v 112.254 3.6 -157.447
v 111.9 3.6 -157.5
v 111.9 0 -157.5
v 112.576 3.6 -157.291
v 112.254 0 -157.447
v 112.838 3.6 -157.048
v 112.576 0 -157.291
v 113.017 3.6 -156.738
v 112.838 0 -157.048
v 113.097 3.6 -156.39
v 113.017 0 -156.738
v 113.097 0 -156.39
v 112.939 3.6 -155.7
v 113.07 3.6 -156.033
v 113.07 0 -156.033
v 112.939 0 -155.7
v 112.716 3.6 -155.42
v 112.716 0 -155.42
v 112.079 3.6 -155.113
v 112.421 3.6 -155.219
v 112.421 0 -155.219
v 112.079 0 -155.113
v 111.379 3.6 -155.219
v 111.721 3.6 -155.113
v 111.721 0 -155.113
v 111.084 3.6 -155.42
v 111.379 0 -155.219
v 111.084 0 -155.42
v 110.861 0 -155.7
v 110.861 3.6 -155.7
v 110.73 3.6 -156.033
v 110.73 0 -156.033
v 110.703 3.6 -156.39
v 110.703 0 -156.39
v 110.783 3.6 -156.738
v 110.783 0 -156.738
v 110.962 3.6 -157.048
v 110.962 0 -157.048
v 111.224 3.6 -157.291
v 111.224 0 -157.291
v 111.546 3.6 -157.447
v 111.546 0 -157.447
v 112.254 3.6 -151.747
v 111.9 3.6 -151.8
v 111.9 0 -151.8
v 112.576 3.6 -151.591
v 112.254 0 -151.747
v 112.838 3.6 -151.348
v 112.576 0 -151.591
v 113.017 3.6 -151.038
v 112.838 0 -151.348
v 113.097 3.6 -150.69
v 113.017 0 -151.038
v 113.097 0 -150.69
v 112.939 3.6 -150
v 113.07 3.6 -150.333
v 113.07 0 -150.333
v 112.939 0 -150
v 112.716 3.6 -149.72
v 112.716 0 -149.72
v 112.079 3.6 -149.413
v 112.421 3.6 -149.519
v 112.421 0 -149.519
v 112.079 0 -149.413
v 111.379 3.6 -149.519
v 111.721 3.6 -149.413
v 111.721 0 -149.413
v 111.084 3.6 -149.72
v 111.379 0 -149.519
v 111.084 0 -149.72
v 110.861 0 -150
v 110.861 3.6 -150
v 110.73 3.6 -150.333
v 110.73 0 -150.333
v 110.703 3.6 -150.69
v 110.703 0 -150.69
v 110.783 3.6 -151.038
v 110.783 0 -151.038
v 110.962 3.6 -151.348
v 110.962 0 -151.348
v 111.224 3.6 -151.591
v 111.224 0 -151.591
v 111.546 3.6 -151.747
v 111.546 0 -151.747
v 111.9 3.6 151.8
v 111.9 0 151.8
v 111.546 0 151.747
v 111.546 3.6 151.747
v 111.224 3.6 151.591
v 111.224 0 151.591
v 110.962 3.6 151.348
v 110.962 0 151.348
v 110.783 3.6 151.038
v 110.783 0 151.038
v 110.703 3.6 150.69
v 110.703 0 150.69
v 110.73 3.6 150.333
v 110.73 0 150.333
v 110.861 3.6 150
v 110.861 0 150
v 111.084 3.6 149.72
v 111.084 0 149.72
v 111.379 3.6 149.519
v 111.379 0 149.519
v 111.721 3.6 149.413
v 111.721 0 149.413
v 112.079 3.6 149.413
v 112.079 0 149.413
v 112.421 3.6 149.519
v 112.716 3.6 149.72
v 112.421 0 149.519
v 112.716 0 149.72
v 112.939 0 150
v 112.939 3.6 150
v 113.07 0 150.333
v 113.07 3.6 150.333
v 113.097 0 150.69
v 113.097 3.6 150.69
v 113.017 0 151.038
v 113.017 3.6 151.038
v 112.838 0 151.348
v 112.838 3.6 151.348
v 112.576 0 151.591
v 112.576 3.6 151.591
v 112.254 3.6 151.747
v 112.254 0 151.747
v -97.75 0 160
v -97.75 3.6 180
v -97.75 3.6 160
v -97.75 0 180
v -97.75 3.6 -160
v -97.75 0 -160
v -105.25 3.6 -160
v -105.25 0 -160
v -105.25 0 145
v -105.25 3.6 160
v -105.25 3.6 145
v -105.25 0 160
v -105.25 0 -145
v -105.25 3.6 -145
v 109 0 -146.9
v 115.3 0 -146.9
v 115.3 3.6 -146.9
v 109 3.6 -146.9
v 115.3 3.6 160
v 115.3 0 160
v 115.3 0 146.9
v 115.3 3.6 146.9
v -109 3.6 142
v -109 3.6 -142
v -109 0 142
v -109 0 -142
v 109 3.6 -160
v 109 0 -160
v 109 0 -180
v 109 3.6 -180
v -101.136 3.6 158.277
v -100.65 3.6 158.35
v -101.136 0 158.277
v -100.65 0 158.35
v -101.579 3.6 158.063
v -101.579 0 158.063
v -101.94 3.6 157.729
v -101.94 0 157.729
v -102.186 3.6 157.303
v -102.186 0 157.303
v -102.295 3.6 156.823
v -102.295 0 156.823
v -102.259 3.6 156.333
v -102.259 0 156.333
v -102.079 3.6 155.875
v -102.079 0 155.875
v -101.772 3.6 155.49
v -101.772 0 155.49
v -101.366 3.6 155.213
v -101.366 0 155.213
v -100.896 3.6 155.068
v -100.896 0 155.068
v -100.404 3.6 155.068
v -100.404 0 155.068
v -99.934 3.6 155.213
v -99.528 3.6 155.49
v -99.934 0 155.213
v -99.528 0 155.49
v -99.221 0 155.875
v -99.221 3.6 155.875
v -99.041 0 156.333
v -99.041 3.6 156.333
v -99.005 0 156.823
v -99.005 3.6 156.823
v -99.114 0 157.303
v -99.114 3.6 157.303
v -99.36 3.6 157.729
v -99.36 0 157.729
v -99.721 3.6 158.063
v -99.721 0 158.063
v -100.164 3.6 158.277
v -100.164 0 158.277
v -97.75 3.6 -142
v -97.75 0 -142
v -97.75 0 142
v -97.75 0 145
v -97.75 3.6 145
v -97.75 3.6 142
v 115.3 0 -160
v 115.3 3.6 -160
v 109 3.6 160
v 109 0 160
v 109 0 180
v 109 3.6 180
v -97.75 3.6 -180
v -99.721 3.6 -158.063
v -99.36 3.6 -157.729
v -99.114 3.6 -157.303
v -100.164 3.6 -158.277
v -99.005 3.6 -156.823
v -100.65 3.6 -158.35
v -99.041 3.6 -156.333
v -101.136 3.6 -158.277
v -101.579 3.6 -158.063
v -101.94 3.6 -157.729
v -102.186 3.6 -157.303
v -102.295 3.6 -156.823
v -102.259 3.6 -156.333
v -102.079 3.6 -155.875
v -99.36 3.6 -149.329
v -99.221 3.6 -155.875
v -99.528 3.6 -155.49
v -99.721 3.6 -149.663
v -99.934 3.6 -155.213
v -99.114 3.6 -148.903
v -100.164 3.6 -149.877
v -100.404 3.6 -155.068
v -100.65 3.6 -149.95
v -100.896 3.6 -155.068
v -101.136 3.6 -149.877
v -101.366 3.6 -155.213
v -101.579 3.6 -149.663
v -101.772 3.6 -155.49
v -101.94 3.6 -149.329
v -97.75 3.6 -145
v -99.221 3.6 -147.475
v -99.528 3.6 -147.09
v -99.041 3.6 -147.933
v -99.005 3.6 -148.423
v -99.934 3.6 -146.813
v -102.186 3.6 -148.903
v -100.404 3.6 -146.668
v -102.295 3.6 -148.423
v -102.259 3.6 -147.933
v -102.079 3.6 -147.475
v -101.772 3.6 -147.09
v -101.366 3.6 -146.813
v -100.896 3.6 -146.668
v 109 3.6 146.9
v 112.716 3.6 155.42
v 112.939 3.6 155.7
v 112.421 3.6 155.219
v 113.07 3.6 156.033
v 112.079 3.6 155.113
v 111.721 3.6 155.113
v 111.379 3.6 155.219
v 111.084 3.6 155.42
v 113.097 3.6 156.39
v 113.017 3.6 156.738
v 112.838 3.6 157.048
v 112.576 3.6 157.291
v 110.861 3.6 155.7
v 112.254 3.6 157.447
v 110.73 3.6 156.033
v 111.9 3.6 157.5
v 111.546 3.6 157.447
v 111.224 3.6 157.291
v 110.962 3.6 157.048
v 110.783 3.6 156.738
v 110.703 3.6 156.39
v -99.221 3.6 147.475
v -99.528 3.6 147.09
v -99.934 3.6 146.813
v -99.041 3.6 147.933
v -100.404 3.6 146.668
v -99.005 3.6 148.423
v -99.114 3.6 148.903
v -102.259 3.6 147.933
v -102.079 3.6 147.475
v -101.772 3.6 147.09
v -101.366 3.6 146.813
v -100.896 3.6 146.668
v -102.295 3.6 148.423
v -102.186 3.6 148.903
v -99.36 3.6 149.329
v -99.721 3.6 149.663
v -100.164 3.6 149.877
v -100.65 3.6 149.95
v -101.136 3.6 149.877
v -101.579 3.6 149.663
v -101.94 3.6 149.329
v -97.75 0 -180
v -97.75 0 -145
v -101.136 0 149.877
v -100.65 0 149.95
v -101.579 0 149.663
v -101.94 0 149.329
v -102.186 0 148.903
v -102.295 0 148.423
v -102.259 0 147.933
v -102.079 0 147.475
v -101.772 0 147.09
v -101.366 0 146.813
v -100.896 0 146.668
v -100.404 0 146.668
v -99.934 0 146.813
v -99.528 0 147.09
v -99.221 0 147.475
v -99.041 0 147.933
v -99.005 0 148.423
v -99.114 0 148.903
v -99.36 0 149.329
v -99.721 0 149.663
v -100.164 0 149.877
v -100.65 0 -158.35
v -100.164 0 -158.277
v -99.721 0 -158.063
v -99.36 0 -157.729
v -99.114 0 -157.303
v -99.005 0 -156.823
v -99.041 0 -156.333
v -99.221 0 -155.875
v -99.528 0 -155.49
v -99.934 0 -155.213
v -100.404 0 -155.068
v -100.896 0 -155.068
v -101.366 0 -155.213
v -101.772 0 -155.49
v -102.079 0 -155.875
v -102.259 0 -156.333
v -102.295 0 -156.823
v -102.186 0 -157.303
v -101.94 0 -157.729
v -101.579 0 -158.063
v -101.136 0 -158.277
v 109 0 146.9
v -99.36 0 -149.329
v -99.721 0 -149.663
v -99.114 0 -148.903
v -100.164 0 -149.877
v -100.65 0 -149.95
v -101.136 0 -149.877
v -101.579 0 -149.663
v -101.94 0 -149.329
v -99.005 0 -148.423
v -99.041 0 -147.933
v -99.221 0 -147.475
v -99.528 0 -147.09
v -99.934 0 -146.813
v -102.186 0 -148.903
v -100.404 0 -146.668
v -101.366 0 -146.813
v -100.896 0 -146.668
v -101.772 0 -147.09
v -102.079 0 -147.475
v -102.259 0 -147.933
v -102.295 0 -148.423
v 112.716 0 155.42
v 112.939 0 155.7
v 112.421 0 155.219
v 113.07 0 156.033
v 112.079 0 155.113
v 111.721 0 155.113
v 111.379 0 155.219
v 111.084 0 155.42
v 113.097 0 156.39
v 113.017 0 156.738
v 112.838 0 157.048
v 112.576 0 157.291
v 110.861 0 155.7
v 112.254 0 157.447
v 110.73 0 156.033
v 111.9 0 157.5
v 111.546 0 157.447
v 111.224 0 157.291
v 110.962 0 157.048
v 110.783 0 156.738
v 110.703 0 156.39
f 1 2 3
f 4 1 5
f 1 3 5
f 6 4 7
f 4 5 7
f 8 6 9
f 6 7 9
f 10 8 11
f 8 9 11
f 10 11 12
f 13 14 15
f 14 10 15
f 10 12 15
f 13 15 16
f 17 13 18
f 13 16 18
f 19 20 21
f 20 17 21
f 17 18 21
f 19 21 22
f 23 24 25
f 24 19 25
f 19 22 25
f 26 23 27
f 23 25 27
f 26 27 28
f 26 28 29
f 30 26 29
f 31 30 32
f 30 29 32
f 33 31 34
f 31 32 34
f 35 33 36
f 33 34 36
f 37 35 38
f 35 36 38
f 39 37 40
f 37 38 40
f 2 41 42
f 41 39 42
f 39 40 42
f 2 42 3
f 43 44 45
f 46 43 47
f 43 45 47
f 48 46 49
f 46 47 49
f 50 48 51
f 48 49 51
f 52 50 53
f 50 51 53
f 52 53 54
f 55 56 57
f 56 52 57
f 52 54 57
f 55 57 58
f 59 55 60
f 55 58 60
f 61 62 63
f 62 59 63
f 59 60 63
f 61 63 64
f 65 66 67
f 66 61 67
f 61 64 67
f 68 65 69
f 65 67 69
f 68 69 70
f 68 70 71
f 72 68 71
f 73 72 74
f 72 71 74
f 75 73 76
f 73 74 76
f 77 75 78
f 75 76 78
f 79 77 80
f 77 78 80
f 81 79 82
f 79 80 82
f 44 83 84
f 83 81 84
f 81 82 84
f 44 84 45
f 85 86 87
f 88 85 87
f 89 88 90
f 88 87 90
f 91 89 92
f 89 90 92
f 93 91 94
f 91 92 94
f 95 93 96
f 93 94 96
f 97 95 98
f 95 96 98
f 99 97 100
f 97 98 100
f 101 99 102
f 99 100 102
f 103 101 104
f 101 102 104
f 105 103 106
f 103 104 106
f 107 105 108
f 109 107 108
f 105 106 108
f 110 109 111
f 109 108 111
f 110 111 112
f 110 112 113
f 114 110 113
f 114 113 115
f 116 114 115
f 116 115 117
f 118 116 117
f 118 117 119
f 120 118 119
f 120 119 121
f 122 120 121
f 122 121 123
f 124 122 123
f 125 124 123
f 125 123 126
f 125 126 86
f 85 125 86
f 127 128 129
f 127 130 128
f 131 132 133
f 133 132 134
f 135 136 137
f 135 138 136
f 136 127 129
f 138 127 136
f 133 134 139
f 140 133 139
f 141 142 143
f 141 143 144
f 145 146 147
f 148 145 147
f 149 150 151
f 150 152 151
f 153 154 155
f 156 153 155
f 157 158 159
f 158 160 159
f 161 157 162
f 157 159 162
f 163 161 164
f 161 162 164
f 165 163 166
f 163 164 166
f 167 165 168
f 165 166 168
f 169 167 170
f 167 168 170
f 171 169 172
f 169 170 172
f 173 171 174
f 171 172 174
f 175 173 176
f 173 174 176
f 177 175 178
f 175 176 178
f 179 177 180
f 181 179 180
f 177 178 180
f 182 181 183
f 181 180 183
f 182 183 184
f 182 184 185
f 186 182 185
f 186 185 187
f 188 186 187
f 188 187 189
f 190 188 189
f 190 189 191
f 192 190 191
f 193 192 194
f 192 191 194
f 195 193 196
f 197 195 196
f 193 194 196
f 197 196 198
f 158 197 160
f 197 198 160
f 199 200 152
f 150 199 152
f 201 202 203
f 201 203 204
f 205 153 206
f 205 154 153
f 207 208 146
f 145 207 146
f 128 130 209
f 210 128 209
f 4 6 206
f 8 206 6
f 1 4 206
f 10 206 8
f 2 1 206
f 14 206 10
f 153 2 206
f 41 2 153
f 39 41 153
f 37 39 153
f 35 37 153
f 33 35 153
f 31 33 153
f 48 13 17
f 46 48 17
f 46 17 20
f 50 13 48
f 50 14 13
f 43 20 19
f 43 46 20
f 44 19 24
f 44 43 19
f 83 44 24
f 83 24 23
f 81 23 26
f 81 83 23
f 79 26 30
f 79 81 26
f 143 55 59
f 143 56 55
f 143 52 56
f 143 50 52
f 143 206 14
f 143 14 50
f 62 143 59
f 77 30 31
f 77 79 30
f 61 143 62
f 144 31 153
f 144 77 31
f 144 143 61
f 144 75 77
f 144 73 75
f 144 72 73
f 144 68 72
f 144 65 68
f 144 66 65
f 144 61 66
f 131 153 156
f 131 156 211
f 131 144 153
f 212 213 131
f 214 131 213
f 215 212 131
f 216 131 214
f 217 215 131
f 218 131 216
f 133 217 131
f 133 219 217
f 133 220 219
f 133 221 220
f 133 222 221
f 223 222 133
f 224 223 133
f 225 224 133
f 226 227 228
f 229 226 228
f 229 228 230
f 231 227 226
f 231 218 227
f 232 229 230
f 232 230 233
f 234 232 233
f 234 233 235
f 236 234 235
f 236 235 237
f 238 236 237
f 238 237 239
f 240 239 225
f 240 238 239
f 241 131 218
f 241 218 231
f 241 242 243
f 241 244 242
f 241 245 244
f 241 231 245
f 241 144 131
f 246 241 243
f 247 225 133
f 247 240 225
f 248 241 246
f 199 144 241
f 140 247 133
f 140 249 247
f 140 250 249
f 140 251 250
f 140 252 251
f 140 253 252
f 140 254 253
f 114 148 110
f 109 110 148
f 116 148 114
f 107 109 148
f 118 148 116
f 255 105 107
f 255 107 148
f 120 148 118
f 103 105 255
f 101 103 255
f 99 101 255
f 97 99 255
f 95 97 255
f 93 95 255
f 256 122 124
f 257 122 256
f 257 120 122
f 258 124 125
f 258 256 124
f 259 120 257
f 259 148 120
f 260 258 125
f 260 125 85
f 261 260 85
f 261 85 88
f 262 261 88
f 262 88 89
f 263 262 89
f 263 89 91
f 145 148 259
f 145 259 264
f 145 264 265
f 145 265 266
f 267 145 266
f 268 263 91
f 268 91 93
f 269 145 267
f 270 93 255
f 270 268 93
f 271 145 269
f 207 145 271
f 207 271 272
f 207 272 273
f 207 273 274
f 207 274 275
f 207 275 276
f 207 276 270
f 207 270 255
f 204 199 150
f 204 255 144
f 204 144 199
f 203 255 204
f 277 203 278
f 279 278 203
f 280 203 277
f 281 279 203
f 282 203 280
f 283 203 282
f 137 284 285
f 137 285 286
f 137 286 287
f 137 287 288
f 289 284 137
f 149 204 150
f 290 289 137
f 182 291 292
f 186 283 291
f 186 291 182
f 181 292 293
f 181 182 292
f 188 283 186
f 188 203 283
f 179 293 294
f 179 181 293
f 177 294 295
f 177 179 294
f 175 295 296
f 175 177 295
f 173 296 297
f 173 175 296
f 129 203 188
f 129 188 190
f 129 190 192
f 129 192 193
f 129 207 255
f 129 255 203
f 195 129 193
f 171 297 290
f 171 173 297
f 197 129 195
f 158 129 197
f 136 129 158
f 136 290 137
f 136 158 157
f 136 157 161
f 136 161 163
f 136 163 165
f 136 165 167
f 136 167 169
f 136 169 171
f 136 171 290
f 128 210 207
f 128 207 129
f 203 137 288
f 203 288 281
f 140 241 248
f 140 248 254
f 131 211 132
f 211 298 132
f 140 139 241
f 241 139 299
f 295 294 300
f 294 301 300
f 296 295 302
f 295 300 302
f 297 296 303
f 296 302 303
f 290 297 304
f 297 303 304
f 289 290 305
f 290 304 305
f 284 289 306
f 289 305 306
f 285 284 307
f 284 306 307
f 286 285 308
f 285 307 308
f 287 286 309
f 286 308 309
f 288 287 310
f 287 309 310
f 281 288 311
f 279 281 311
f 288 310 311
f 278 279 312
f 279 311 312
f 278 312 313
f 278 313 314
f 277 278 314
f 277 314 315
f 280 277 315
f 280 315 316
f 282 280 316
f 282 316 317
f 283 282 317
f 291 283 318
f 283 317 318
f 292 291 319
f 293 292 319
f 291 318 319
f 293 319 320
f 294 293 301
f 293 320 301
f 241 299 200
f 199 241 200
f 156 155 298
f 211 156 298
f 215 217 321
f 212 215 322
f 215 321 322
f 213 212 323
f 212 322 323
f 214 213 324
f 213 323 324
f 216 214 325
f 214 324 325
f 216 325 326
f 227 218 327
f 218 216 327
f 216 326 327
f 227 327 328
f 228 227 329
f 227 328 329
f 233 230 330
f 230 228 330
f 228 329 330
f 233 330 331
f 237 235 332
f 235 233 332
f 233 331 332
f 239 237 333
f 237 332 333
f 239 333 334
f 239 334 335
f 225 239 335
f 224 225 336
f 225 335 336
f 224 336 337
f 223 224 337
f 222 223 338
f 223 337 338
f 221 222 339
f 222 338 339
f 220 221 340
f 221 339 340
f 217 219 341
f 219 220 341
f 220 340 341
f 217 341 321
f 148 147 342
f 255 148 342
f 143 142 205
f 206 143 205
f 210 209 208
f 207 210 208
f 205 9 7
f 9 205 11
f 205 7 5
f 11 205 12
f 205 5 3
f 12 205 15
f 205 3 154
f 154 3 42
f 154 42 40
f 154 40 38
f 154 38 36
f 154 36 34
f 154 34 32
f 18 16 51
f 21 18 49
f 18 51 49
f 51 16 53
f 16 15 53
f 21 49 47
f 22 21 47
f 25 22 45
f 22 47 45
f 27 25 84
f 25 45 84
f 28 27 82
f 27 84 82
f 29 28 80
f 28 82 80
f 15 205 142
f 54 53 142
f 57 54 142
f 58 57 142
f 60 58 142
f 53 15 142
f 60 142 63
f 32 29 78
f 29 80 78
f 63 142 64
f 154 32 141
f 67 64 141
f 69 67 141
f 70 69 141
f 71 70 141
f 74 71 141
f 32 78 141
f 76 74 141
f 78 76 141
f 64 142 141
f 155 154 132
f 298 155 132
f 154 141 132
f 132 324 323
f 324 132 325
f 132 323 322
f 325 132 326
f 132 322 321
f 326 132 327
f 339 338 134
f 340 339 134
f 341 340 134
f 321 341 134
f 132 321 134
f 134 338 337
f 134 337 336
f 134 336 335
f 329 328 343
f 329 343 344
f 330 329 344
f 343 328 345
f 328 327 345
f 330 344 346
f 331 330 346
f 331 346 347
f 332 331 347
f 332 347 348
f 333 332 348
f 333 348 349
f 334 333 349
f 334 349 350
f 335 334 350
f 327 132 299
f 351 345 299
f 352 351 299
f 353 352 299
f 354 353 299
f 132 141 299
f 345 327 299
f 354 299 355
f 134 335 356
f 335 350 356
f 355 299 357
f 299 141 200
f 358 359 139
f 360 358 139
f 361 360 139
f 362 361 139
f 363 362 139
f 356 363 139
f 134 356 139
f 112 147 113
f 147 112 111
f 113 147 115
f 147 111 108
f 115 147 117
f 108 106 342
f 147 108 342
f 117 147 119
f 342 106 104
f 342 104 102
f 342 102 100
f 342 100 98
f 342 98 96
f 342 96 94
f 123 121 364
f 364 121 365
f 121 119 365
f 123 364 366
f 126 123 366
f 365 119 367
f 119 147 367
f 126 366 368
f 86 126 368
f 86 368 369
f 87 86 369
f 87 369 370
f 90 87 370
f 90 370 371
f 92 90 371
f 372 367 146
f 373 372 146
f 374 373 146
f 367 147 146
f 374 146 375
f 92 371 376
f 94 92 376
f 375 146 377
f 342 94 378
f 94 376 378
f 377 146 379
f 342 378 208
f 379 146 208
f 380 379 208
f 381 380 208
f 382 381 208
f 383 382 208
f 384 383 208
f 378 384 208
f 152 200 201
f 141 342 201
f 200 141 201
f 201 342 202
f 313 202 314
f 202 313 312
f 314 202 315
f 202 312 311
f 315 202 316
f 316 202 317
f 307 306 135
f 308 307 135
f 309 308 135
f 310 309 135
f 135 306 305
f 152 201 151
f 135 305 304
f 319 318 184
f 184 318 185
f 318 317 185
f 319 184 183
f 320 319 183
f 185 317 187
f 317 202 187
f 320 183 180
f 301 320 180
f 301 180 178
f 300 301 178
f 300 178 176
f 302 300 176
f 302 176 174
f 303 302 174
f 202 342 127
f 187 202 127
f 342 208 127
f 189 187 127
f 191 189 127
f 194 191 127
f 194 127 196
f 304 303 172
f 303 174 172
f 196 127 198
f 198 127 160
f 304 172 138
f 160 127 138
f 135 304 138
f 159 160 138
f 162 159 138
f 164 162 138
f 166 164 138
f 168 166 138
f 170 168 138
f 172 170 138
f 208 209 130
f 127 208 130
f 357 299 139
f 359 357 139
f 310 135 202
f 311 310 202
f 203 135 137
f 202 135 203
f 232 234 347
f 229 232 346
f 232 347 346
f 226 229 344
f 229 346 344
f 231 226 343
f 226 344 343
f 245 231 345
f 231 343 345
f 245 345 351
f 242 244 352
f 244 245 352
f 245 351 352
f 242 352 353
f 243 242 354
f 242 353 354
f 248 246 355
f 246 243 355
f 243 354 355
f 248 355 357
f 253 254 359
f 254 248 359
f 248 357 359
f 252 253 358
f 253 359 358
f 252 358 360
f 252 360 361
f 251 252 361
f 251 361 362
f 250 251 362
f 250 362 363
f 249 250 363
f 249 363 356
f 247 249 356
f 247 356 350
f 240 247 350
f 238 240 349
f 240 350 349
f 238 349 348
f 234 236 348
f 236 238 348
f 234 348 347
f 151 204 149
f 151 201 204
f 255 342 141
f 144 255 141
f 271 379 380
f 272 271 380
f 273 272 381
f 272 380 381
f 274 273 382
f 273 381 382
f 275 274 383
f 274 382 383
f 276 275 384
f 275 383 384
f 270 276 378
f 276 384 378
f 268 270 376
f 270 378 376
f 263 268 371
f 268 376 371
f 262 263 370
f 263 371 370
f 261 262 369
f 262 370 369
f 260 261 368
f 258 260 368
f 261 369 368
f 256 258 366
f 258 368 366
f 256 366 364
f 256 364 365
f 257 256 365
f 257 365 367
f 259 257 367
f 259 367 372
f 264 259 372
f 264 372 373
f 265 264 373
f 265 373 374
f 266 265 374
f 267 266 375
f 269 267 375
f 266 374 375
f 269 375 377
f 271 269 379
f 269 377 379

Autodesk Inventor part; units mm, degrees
ref_plane "YZ Plane" through (0, 0, 0) normal (1, 0, 0) x (0, 1, 0)
ref_plane "XZ Plane" through (0, 0, 0) normal (0, 1, 0) x (-1, 0, 0)
ref_plane "XY Plane" through (0, 0, 0) normal (0, 0, 1) x (1, 0, 0)
sketch "Boceto3" plane through (0, 0, 0) normal (0, 1, 0) x (-1, 0, 0)
  line L0 (-109, -180) -> (109, -180)
  line L1 (109, -180) -> (109, 180)
  line L2 (109, 180) -> (-109, 180)
  line L3 (-109, 180) -> (-109, -180)
  line L4 (-109, -180) -> (109, 180) construction
  line L5 (109, -180) -> (-109, 180) construction
  line L6 (0, 180) -> (103.5, 180)
  line L7 (109, 180) -> (97.75, 180)
  line L8 (97.75, 180) -> (97.75, 160)
  line L9 (97.75, 180) -> (117.75, 180) construction
  line L10 (97.75, 160) -> (105.25, 160)
  line L11 (105.25, 160) -> (105.25, 145)
  line L12 (105.25, 145) -> (97.75, 145)
  line L13 (97.75, 145) -> (97.75, 142)
  line L14 (97.75, 142) -> (109, 142)
  line L15 (109, -180) -> (97.75, -180)
  line L16 (97.75, -180) -> (97.75, -160)
  line L17 (97.75, -180) -> (117.75, -180) construction
  line L18 (97.75, -160) -> (105.25, -160)
  line L19 (105.25, -160) -> (105.25, -145)
  line L20 (105.25, -145) -> (97.75, -145)
  line L21 (97.75, -145) -> (97.75, -142)
  line L22 (97.75, -142) -> (109, -142)
  line L23 (-109, 180) -> (-102.7, 180)
  line L24 (-109, 180) -> (-109, 160)
  line L25 (-109, 160) -> (-115.3, 160)
  line L26 (-109, 160) -> (-109, 146.9)
  line L27 (-115.3, 146.9) -> (-109, 146.9)
  line L28 (-109, 146.9) -> (-109, -180)
  line L29 (-102.7, -180) -> (-102.7, -160)
  line L30 (-102.7, -180) -> (-82.7, -180) construction
  line L31 (-109, -160) -> (-115.3, -160)
  line L32 (-109, -160) -> (-109, -146.9)
  line L33 (-115.3, -146.9) -> (-109, -146.9)
  line L34 (-115.3, 160) -> (-115.3, 146.9)
  line L35 (-115.3, -146.9) -> (-115.3, -160)
  point P0 (0, 0)
  point P1 (-109, -180)
  dimension "d27" = 218
  dimension "d28" = 360
  dimension "d33" = 11.25
  dimension "d34" = 20
  dimension "d35" = 90
  dimension "d36" = 7.5
  dimension "d37" = 15
  dimension "d38" = 7.5
  dimension "d39" = 3
  dimension "d40" = 11.25
  dimension "d41" = 20
  dimension "d42" = 90
  dimension "d43" = 15
  dimension "d44" = 3
  dimension "d45" = 6.3
  dimension "d46" = 20
  dimension "d47" = 90
  dimension "d48" = 13.1
  dimension "d49" = 90
  dimension "d50" = 20
  dimension "d51" = 90
  dimension "d52" = 13.1
extrude "Extrusión2" add sketch "Boceto3" along normal blind 3.6 contours L3 L2 L8 L10 L11 L12 L13 L14 L1 L22 L21 L20 L19 L18 L16 L0 | L31 L35 L33 L3 | L27 L34 L25 L3
sketch "Boceto4" plane through (0, 3.6, 0) normal (0, 1, 0) x (1, 0, 0)
  line L0 (-105.25, -145) -> (-105.25, -160) projected
  line L1 (-105.25, -160) -> (-97.75, -160) projected
  line L2 (-97.75, -145) -> (-105.25, -145) projected
  point P0 (0, 0)
  point P1 (-100.65, -156.7)
  point P2 (-100.65, -148.3)
  dimension "d55" = 4.6
  dimension "d56" = 3.3
  dimension "d73" = 3.3
  dimension "d74" = 4.6
hole "Agujero1" at (-100.65, 3.6, 156.7) at (-100.65, 3.6, 148.3) direction (0, -1, 0) diameter 3.3 end through all
mirror "Simetría1" about plane through (0, 0, 0) normal (0, 0, 1) of "Agujero1"
sketch "Boceto6" plane through (0, 3.6, 0) normal (0, 1, 0) x (1, 0, 0)
  line L0 (109, -160) -> (115.3, -160) projected
  line L1 (109, 160) -> (109, 180) projected
  line L2 (115.3, -146.9) -> (109, -146.9) projected
  line L3 (115.3, -156.3) -> (111.9, -156.3)
  line L4 (111.9, -156.3) -> (111.9, -150.6)
  circle A0 centre (111.9, -156.3) radius 1.2
  circle A1 centre (111.9, -150.6) radius 1.2
  point P0 (0, 0)
  point P1 (105.6, -156.3)
  point P2 (102.7, -160)
  point P3 (105.6, -150.6)
  point P4 (102.7, -146.9)
  dimension "d75" = 3.7
  dimension "d76" = 3.4
  dimension "d77" = 3.7
  dimension "d78" = 3.4
  dimension "d95" = 3.4
  dimension "d96" = 2.4
  dimension "d97" = 2.4
hole "Agujero3" at (111.9, 3.6, 156.3) at (111.9, 3.6, 150.6) direction (0, -1, 0) diameter 2.4 end through all
mirror "Simetría2" about plane through (0, 0, 0) normal (0, 0, 1) of "Agujero3"
equation "\"d57\" = d73"
properties part number "pantalla"
